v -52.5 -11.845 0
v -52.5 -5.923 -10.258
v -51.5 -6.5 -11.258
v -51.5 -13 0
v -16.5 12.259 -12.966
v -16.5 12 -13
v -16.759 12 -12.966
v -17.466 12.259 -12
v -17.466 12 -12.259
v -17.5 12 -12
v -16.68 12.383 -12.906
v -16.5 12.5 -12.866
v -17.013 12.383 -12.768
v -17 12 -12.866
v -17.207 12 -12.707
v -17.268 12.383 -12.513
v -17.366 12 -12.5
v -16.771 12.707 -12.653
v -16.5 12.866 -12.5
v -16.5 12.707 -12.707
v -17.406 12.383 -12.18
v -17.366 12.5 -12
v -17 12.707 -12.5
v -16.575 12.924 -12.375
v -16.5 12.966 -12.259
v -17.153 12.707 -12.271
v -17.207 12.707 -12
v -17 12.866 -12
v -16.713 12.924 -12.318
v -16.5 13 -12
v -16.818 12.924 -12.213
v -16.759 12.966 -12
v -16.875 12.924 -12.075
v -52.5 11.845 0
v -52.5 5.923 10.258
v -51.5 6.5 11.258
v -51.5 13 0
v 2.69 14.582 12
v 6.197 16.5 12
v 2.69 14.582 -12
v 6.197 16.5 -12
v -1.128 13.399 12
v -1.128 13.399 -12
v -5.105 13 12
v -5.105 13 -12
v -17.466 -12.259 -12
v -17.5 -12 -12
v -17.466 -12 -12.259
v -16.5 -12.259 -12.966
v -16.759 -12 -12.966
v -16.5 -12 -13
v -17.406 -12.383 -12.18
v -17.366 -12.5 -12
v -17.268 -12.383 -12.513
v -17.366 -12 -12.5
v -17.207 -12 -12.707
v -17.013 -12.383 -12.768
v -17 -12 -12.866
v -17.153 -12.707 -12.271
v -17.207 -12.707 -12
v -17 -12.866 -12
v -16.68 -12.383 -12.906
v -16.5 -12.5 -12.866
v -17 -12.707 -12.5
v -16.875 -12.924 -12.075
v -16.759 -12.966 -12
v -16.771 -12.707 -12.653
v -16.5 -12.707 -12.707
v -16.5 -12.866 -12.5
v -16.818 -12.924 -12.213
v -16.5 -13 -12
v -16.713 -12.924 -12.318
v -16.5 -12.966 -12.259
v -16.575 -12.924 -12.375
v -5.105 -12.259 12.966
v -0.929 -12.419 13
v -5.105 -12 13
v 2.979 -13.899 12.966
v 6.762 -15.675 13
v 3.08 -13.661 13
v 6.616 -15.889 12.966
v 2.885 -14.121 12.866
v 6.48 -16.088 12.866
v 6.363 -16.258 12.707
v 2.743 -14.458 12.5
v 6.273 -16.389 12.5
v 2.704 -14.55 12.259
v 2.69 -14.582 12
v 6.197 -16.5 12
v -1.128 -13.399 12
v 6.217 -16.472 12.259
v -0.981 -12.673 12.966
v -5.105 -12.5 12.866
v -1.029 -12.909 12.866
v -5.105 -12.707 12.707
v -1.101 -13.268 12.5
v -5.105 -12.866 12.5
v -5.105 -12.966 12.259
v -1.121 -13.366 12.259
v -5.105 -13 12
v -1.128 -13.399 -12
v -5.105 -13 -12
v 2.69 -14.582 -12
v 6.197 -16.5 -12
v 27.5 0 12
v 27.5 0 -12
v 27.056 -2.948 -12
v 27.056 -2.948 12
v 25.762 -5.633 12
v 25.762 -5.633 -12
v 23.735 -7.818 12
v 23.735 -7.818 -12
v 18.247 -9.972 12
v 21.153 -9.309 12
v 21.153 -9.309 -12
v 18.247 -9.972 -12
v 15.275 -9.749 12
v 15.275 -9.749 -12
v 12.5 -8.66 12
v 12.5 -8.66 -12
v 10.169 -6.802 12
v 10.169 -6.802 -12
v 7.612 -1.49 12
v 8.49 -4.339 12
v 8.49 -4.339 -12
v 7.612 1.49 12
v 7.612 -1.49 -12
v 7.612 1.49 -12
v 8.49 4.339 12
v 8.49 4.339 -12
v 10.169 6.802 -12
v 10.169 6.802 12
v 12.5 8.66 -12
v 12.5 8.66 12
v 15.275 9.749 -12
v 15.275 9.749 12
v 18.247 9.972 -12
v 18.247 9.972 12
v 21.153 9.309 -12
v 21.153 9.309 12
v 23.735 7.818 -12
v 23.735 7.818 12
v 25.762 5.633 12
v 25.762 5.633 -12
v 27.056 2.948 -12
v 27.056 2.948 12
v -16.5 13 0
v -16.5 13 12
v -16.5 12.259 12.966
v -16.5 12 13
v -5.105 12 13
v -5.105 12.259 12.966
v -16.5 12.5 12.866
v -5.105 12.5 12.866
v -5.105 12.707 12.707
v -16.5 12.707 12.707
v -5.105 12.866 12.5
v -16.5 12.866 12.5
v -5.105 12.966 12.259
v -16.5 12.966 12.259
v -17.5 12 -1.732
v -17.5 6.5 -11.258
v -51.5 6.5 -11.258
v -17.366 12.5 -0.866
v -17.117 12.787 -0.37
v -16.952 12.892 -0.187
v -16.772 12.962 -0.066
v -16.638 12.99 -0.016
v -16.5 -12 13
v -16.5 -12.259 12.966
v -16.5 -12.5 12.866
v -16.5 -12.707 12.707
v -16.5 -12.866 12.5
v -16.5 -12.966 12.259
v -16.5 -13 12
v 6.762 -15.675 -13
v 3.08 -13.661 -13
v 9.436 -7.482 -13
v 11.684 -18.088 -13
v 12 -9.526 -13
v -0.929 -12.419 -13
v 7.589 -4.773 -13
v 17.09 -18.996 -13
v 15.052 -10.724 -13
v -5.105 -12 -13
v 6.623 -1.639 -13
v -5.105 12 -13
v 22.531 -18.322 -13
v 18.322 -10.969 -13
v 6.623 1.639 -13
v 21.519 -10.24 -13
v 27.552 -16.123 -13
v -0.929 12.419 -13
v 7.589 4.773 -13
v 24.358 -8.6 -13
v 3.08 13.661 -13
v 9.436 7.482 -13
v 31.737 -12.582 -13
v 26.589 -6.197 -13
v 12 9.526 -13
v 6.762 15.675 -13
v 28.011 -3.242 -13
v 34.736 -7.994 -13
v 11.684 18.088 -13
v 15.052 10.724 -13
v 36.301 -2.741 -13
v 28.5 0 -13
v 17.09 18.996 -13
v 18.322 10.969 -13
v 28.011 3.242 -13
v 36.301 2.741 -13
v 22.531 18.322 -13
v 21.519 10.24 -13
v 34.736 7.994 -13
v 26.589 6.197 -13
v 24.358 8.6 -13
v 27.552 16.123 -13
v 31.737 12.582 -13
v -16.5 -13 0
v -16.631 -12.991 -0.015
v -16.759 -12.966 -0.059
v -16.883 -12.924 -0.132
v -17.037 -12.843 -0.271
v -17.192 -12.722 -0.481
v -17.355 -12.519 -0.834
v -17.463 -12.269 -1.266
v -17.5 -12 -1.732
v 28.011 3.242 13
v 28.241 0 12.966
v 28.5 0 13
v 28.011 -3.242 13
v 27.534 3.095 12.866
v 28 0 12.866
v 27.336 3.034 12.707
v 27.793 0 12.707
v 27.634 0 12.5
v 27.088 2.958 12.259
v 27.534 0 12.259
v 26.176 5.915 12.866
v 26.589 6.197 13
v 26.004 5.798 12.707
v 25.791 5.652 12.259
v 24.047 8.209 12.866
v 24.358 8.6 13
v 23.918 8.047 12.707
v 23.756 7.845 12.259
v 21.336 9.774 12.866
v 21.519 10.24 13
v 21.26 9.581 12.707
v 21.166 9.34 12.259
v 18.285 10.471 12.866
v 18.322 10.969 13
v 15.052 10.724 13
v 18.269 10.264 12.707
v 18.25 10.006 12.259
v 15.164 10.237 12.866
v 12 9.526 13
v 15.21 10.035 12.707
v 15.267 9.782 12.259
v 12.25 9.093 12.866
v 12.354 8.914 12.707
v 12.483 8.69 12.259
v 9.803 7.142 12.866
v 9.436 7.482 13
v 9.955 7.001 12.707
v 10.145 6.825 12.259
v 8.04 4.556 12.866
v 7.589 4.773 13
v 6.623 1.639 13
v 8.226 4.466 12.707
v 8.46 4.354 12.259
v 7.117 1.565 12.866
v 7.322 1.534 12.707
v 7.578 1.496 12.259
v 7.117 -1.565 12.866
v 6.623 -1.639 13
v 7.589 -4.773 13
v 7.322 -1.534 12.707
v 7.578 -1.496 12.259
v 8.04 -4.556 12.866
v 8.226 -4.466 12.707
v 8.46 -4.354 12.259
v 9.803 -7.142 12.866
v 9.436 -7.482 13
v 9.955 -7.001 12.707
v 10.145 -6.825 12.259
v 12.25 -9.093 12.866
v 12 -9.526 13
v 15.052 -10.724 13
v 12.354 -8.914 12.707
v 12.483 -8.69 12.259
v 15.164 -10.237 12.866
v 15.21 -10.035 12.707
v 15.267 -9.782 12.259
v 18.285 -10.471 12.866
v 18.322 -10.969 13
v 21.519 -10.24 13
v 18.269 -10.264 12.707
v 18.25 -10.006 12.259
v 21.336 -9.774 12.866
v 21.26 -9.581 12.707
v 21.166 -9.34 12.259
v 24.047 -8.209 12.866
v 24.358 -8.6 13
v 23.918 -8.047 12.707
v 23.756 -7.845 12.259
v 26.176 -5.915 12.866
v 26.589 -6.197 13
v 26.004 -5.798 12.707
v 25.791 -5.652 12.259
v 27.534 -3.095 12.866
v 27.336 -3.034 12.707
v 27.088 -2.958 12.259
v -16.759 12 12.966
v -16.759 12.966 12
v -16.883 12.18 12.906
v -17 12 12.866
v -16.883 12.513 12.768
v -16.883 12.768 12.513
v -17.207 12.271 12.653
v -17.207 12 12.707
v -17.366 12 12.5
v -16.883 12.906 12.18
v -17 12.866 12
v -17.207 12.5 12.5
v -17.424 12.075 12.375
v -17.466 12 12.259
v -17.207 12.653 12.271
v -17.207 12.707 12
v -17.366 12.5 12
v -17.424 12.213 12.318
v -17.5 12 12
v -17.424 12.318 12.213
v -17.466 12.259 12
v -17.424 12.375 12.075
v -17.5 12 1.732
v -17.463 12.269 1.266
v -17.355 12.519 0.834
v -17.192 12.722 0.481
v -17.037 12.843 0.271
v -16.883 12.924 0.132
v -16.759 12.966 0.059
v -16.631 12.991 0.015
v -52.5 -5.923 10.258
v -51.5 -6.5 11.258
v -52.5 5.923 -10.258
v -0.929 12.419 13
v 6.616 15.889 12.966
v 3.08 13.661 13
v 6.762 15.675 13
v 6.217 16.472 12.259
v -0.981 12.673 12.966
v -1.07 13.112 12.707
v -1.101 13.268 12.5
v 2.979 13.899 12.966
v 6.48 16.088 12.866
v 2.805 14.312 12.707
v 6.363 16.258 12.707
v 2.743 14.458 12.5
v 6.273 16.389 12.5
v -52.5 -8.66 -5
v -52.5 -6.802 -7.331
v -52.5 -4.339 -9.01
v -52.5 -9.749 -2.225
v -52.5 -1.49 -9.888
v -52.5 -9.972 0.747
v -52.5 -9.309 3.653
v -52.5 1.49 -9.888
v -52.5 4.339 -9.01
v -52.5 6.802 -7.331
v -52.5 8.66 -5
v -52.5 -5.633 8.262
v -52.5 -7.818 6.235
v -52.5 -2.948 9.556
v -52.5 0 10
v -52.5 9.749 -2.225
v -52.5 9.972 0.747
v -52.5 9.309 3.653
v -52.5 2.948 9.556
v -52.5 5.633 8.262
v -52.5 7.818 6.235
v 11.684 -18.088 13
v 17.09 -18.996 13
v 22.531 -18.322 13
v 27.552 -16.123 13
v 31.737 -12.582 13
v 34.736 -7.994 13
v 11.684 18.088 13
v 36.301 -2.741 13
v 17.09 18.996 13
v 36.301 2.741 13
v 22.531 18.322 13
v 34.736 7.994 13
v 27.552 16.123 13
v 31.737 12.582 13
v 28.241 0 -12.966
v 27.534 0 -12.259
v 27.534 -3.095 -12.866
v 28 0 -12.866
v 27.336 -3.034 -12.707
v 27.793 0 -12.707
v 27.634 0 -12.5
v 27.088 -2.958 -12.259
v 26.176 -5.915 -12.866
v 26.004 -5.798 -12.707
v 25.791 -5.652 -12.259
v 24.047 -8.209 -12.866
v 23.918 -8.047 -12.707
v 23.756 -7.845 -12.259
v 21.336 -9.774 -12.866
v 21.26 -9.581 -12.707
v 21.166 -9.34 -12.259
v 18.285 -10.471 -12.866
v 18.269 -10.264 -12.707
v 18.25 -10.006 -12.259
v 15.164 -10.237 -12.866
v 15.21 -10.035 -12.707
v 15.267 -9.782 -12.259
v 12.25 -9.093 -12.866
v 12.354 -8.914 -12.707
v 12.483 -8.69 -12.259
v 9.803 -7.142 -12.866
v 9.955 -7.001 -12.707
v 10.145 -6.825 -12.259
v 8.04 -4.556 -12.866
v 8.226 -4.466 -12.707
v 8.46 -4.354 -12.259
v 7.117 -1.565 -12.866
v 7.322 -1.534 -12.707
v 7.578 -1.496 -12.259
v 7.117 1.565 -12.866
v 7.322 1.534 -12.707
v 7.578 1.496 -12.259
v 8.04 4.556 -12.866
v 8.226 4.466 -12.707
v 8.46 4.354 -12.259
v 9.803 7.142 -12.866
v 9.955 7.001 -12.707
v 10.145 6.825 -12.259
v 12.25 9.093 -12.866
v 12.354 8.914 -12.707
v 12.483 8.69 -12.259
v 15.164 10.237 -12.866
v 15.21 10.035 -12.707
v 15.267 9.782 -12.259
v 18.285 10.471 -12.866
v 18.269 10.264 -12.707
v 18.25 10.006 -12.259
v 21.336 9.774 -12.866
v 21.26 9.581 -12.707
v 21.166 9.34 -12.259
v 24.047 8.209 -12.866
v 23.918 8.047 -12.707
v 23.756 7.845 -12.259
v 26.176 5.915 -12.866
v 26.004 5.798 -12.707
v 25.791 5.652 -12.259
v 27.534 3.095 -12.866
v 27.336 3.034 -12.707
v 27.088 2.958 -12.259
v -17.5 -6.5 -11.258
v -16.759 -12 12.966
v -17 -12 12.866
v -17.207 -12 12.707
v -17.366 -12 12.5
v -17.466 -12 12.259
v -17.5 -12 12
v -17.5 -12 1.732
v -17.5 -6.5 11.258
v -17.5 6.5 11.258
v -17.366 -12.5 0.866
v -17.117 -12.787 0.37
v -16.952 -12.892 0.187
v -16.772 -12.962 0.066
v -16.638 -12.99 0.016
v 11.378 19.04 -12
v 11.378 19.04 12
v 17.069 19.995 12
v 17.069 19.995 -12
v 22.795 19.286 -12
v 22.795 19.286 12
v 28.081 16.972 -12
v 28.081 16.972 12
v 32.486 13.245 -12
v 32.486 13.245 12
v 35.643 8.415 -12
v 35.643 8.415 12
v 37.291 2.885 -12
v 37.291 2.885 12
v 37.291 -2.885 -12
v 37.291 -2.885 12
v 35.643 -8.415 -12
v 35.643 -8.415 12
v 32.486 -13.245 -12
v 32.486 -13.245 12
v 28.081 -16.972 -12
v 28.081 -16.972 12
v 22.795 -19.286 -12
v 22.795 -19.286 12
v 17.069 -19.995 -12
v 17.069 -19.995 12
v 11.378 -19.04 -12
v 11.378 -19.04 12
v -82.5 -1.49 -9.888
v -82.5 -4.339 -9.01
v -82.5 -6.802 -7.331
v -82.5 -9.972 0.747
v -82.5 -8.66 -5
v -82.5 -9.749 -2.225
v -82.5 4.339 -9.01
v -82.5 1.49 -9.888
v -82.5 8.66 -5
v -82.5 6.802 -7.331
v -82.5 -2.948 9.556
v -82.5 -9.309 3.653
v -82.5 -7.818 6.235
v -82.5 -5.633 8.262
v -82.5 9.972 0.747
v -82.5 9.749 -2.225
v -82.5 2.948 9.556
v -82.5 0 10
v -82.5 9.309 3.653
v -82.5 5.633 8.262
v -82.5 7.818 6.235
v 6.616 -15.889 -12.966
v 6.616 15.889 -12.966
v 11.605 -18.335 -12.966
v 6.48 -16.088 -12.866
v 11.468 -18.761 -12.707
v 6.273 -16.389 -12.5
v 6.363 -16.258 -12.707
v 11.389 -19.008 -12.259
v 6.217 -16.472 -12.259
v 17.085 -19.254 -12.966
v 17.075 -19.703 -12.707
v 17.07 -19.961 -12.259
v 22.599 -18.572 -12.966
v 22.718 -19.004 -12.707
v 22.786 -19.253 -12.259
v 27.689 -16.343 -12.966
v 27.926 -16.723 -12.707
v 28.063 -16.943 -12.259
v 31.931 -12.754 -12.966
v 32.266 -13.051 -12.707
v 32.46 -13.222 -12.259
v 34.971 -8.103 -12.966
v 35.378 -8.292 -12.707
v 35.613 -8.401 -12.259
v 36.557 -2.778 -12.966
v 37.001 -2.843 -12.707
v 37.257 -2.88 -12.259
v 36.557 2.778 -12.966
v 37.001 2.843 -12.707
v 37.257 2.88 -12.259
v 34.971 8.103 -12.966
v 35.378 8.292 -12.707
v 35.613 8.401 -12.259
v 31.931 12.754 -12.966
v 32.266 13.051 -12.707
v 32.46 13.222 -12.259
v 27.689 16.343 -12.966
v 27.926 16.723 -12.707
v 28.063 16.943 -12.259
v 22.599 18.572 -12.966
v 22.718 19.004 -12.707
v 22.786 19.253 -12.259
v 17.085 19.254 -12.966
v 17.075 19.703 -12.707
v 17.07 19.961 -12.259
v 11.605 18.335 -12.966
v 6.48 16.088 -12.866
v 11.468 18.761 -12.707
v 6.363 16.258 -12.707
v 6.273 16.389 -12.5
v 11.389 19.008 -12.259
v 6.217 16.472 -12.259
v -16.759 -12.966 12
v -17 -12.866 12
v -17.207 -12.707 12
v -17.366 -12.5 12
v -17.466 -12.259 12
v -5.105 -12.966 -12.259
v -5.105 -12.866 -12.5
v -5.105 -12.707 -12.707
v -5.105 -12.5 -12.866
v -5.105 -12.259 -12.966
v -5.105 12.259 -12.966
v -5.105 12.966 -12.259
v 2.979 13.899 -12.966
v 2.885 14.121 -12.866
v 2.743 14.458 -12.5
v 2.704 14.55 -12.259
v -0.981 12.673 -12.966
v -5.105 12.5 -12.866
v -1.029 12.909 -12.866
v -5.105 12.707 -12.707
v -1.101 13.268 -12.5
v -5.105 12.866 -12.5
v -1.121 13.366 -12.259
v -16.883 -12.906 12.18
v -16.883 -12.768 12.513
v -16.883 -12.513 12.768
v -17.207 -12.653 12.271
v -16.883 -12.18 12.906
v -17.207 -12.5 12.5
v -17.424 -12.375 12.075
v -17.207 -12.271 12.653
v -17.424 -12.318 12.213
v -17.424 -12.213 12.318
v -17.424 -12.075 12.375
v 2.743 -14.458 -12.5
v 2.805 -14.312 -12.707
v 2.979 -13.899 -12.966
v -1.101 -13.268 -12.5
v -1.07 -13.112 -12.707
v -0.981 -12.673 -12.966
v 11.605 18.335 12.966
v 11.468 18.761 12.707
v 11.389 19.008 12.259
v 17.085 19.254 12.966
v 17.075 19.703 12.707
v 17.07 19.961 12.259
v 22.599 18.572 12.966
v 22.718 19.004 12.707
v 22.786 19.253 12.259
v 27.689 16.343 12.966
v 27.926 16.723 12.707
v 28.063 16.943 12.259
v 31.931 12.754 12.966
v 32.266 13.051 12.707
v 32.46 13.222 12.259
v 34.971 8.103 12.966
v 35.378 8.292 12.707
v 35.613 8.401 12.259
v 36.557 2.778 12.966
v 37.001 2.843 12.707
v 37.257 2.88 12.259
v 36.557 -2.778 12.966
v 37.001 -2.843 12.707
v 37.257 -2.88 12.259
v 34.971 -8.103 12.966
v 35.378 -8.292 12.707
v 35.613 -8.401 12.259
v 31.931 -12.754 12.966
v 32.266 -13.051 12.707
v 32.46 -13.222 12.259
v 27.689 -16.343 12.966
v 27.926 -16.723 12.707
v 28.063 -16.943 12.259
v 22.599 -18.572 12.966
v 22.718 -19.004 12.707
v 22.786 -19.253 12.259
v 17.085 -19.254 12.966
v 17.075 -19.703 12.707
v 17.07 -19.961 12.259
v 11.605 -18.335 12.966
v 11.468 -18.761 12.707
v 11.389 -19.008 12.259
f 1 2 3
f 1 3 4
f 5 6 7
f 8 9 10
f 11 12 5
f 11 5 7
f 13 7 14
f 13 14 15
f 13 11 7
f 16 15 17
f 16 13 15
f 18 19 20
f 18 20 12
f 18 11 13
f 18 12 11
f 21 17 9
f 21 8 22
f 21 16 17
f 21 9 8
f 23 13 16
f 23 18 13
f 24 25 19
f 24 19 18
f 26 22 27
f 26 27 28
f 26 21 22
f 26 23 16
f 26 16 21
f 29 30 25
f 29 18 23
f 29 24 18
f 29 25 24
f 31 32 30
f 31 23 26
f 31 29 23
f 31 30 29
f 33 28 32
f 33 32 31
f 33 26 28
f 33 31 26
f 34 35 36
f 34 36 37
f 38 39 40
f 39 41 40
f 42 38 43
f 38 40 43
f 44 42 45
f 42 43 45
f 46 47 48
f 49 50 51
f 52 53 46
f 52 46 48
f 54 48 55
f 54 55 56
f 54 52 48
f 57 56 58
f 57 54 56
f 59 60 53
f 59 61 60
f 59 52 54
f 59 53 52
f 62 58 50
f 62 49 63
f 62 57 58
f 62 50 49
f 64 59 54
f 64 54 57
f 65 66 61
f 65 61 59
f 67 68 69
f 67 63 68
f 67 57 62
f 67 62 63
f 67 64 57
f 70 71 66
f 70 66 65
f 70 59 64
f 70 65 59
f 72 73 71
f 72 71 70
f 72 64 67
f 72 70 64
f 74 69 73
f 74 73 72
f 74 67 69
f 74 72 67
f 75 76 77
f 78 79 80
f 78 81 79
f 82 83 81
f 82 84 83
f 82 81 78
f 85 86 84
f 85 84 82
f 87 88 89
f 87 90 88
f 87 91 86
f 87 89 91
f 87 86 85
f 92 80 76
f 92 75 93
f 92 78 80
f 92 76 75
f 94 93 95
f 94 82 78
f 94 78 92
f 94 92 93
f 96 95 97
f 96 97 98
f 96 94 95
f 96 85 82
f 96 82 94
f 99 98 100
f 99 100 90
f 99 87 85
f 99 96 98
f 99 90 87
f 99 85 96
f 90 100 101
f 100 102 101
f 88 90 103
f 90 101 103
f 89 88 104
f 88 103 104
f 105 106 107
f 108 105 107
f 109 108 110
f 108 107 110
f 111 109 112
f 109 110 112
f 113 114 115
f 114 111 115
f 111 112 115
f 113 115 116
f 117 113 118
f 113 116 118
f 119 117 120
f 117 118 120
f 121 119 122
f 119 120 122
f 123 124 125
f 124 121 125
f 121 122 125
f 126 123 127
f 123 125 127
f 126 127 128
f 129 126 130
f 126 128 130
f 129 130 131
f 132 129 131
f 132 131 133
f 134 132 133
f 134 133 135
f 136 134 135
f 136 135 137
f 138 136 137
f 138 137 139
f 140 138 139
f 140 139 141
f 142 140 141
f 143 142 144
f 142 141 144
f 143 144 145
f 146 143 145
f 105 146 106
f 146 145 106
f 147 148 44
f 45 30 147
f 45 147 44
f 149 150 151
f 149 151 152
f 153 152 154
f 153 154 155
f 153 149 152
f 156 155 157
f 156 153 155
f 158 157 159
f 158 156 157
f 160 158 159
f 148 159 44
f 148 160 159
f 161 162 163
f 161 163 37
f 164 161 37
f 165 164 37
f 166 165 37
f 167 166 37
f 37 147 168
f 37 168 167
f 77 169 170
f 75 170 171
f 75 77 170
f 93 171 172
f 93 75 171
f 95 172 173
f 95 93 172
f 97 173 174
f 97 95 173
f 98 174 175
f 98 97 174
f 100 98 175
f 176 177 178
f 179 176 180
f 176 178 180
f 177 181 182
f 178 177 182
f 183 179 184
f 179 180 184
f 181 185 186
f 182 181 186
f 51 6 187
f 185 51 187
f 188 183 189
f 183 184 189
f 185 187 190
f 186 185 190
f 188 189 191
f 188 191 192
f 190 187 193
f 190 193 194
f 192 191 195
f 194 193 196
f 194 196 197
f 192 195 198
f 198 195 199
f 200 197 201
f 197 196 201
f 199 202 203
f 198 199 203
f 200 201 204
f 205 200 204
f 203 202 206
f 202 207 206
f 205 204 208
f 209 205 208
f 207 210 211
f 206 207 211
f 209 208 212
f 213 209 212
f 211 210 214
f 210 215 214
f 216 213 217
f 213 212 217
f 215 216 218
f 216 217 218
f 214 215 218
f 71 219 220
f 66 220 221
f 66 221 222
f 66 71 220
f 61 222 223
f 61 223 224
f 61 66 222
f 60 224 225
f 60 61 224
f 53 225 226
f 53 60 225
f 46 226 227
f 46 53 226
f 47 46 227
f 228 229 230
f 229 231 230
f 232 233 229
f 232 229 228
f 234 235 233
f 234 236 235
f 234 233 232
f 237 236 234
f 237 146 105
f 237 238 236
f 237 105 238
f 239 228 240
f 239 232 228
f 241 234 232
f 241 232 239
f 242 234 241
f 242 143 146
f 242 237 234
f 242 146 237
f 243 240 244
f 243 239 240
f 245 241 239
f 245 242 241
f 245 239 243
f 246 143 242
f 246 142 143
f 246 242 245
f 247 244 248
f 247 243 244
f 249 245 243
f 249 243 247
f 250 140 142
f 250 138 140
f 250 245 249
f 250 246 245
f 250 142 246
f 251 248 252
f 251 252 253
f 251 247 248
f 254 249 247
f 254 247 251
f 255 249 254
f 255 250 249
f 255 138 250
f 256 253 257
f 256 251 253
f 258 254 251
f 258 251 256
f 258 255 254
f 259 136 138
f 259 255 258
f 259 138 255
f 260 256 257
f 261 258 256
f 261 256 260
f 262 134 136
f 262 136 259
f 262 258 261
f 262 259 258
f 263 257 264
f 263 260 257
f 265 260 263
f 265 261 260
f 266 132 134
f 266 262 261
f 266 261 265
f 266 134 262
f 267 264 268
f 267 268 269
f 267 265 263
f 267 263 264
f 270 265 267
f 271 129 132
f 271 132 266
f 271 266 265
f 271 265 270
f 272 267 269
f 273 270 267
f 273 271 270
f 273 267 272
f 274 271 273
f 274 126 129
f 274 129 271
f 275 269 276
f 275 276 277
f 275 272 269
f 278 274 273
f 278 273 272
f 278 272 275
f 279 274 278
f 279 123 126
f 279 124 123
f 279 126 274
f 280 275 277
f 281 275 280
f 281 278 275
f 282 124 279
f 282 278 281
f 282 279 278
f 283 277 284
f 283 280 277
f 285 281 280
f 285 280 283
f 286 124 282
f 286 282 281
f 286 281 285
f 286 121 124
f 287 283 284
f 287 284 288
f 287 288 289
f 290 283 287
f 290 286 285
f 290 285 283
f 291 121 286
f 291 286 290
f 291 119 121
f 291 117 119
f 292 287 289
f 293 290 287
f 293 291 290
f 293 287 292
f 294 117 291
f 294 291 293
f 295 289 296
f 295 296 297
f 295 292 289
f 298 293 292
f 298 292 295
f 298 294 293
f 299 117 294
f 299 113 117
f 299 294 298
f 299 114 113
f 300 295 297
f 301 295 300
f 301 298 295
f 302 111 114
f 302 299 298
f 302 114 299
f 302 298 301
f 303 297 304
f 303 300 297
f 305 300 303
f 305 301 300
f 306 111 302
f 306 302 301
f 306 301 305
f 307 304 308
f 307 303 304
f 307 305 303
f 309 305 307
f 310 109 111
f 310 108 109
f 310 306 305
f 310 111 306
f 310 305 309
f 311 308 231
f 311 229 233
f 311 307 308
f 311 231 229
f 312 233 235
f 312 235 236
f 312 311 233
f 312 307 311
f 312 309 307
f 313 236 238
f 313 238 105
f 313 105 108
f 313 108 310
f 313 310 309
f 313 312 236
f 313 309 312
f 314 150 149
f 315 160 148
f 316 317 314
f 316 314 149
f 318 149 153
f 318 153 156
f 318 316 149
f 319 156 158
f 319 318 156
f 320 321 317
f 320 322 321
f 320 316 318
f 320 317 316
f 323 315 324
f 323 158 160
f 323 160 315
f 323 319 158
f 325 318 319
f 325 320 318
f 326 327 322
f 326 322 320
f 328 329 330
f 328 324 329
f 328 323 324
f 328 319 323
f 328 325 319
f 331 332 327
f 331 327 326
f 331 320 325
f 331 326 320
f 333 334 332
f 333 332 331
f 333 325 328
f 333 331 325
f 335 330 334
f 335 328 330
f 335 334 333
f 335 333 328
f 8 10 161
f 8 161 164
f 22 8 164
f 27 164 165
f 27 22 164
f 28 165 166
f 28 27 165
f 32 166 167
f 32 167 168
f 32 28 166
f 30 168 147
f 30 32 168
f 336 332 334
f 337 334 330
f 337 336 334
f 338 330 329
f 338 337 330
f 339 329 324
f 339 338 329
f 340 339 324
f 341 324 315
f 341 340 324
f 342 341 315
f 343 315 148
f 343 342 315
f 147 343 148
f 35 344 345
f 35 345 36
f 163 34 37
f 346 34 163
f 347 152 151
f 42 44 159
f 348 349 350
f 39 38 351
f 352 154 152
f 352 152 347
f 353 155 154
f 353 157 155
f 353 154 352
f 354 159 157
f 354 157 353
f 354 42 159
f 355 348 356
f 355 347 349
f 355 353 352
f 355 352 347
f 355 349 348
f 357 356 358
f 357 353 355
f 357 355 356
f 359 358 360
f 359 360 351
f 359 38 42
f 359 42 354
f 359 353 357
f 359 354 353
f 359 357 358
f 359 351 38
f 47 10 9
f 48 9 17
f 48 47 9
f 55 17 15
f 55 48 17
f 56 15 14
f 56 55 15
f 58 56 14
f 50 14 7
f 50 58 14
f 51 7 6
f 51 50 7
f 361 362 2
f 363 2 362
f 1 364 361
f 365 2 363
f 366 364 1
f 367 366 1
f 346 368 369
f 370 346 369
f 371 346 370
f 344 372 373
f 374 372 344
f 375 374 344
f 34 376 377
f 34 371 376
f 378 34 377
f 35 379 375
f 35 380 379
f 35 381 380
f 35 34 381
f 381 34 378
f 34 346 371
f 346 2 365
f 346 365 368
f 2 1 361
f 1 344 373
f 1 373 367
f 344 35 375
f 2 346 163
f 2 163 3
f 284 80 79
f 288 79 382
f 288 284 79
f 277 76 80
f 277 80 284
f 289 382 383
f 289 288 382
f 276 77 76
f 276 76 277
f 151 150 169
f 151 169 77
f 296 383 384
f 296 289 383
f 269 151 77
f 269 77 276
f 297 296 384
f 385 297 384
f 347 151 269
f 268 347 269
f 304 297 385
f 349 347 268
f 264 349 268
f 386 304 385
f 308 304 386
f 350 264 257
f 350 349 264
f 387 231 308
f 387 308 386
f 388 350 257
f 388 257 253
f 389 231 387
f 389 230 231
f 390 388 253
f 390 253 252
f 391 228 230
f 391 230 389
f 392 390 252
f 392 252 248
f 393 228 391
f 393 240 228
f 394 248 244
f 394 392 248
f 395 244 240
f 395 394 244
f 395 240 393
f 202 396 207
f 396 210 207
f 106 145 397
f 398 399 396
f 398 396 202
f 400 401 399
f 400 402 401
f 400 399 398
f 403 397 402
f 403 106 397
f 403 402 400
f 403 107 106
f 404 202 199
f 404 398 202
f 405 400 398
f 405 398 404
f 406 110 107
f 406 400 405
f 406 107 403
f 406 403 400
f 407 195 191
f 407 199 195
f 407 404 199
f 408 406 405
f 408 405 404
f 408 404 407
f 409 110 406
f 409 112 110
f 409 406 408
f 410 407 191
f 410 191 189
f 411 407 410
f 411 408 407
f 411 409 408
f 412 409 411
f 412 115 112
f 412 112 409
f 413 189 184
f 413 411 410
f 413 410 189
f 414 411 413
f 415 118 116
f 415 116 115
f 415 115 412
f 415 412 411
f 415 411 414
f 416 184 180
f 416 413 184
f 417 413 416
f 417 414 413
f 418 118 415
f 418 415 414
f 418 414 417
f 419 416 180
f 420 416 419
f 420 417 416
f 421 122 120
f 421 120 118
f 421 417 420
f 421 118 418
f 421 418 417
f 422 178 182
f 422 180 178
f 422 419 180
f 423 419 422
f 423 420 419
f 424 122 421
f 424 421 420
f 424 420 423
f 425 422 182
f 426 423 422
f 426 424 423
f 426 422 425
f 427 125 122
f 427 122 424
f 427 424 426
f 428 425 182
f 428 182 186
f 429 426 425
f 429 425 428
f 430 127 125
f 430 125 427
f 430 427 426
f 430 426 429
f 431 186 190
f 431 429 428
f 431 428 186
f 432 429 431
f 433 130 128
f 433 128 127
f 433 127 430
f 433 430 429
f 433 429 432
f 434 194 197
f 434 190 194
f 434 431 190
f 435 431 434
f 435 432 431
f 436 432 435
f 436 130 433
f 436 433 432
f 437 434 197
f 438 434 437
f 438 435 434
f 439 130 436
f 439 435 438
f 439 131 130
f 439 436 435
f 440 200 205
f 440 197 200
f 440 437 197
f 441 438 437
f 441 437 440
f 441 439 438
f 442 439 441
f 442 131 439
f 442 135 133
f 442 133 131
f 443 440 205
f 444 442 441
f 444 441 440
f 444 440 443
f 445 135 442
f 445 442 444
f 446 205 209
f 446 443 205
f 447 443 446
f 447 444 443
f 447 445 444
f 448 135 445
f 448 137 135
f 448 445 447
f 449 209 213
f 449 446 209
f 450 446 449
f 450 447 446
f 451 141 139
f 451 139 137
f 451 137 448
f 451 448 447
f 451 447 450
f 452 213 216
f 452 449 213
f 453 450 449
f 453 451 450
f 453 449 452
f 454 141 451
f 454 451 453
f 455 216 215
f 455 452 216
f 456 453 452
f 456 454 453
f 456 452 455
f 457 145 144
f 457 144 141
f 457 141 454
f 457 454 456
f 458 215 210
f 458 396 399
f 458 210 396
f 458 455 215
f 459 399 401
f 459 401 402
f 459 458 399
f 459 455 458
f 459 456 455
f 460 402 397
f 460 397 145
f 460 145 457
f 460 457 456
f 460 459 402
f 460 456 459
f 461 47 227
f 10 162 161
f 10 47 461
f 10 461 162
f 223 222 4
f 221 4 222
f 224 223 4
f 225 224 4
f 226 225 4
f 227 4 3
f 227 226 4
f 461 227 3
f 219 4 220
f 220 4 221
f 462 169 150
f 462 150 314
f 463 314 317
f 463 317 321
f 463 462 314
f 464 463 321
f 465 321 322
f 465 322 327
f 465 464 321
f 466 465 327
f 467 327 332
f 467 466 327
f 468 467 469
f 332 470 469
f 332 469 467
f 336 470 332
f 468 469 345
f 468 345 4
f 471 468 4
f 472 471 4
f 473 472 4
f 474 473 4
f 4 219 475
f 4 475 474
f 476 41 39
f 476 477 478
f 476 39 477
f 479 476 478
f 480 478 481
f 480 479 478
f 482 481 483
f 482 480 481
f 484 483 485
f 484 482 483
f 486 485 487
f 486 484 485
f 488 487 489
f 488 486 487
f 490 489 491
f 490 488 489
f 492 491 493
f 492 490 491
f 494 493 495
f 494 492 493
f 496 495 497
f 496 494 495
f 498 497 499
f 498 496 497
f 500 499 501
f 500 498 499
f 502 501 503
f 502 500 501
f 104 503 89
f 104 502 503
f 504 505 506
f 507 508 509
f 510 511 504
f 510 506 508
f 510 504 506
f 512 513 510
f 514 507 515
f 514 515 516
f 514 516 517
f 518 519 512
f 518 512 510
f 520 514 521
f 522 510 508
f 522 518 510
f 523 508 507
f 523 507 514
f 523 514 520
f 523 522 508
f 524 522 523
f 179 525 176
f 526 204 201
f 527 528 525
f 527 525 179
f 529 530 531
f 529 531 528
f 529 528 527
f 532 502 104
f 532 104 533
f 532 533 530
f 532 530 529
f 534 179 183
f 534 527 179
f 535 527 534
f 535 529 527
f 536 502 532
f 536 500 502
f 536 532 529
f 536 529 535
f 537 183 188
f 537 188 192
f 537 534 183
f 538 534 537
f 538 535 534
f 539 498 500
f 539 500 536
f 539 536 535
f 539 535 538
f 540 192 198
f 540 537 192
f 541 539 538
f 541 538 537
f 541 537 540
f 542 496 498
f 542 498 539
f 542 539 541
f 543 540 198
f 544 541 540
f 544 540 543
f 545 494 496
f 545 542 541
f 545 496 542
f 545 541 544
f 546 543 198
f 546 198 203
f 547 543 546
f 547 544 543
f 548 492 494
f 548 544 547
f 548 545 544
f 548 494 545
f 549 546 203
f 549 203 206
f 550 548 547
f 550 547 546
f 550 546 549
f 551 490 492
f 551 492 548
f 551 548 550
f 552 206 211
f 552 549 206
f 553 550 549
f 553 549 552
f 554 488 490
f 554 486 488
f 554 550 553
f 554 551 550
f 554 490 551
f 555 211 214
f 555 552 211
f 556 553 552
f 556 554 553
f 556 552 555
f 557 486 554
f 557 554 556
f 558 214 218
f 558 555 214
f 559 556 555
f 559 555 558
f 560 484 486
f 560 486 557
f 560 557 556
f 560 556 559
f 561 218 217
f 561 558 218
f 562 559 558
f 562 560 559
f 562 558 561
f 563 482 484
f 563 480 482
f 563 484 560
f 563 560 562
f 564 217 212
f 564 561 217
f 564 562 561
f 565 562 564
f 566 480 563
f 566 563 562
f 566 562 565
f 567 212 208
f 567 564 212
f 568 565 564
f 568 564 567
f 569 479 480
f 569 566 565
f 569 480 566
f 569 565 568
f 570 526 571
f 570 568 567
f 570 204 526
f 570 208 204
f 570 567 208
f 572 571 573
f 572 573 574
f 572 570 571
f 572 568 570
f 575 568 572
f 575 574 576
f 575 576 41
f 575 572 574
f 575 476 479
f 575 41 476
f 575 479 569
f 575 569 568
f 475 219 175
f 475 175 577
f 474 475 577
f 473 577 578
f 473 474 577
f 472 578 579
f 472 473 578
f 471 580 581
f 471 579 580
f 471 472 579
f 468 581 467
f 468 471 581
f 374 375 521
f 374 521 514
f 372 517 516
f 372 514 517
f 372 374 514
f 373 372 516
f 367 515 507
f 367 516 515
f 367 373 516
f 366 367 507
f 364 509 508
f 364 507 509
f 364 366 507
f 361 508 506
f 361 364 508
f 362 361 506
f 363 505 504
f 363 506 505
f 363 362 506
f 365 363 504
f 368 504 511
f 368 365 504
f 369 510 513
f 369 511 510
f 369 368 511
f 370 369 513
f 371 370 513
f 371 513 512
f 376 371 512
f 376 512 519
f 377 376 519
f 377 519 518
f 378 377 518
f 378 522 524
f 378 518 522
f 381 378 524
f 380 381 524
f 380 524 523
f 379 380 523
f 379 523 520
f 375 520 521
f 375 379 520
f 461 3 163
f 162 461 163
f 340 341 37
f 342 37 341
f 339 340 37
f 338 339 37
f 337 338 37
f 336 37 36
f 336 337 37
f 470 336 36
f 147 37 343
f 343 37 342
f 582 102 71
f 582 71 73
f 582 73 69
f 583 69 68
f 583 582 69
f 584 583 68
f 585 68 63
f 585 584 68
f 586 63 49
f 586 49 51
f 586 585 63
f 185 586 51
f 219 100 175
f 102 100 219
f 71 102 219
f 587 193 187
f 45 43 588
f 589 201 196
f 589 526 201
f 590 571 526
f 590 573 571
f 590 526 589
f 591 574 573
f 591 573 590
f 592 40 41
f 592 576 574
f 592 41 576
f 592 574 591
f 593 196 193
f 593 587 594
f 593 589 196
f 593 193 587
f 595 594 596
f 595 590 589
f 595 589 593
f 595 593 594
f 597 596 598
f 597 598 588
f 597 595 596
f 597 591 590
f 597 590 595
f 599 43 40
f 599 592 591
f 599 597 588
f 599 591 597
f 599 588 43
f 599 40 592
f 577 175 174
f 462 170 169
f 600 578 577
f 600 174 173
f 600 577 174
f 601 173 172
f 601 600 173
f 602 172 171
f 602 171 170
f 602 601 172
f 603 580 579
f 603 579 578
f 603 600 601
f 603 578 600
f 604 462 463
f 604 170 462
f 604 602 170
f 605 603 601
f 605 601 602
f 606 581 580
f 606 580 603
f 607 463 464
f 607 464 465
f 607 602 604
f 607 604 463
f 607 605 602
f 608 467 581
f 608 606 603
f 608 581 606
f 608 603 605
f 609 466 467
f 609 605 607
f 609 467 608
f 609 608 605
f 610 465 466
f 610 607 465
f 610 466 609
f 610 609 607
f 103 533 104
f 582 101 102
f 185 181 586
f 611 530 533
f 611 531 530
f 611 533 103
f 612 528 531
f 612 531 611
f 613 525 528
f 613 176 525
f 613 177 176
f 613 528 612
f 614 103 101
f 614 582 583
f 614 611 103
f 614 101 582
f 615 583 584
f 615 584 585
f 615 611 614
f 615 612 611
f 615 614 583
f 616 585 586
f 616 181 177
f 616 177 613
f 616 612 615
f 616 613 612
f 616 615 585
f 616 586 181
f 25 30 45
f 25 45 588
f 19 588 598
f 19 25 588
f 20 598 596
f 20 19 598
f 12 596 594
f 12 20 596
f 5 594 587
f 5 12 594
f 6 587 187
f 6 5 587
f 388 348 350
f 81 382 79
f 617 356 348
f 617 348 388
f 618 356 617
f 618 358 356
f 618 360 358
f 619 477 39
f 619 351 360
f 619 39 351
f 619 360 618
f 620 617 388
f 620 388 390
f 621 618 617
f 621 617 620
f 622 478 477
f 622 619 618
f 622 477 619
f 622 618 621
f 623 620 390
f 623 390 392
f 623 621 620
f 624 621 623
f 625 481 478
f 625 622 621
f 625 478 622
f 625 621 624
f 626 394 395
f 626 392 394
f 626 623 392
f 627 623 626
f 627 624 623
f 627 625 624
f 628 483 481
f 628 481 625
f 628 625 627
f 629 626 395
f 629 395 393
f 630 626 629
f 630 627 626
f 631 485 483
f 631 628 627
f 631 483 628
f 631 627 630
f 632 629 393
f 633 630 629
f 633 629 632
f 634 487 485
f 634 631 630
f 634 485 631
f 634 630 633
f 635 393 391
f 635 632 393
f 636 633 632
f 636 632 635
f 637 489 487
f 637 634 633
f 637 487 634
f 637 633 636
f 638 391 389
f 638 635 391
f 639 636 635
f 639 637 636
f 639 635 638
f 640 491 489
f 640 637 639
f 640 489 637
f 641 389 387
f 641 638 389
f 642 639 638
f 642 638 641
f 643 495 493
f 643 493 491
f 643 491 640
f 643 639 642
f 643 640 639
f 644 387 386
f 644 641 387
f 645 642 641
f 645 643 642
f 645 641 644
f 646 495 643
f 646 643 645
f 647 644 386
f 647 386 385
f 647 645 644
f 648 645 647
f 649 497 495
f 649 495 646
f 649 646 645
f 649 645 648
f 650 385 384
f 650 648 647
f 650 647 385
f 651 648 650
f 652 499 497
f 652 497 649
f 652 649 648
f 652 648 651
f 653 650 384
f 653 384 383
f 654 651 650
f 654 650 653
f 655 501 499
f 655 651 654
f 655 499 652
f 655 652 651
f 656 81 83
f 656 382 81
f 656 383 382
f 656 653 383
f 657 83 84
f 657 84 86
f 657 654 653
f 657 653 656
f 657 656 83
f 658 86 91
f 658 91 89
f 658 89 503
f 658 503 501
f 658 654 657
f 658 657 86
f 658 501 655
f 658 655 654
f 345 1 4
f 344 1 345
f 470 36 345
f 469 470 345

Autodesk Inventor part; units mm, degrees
ref_plane "YZ Plane" through (0, 0, 0) normal (1, 0, 0) x (0, 1, 0)
ref_plane "XZ Plane" through (0, 0, 0) normal (0, 1, 0) x (-1, 0, 0)
ref_plane "XY Plane" through (0, 0, 0) normal (0, 0, 1) x (1, 0, 0)
sketch "Sketch1" plane through (0, 0, 0) normal (0, 0, 1) x (1, 0, 0)
  line L0 (-17.5, 13) -> (2.3013, 13)
  line L1 (2.3013, -13) -> (-17.5, -13)
  line L2 (-17.5, -13) -> (-17.5, 13)
  arc A0 (2.3013, -13) -> (2.3013, 13) centre (17.5, 0) ccw
  circle A1 centre (17.5, 0) radius 10
  point P0 (0, 0)
extrude "Extrusion1" add sketch "Sketch1" along normal mid plane 26
sketch "Sketch2" plane through (-17.5, -13, 13) normal (-1, 0, 0) x (0, 0, 1)
  line L0 (-26, 26) -> (0, 26) projected
  line L1 (-13, 26) -> (-1.7417, 19.5)
  line L2 (-1.7417, 19.5) -> (-1.7417, 6.5)
  line L3 (-1.7417, 6.5) -> (-13, 0)
  line L4 (-13, 0) -> (-24.2583, 6.5)
  line L5 (-24.2583, 6.5) -> (-24.2583, 19.5)
  line L6 (-24.2583, 19.5) -> (-13, 26)
  point P0 (-13, 13)
  point P1 (-13, 13)
extrude "Extrusion2" add sketch "Sketch2" along normal blind 35
sketch "Sketch3" plane through (-52.5, -13, 13) normal (-1, 0, 0) x (0, 0, 1)
  circle A0 centre (-13, 13) radius 10
extrude "Extrusion3" add sketch "Sketch3" along normal blind 30
fillet "Fillet1" radius 20 1 edges at (2.3013, 13, 0)
fillet "Fillet2" radius 20 1 edges at (2.3013, -13, 0)
chamfer "Chamfer1" distance 1 angle 45 6 edges at (-52.5, -9.75, -5.6292) (-52.5, 0, -11.2583) (-52.5, 9.75, -5.6292) (-52.5, -9.75, 5.6292) (-52.5, 0, 11.2583) (-52.5, 9.75, 5.6292)
fillet "Fillet3" radius 1 18 edges at (7.5, 0, -13) (7.5, 0, 13) (0.8108, -13.895, -13) (-11.3027, -13, -13) (0.8108, 13.895, -13) (-11.3027, 13, -13) (37.5, 0, -13) (-17.5, 0, -13) (0.8108, -13.895, 13) (37.5, 0, 13) (0.8108, 13.895, 13) (-11.3027, 13, 13) (-11.3027, -13, 13) (-17.5, 0, 13) (-17.5, -13, 6.5) (-17.5, -13, -6.5) (-17.5, 13, 6.5) (-17.5, 13, -6.5)
properties part number "Single Eye End"
